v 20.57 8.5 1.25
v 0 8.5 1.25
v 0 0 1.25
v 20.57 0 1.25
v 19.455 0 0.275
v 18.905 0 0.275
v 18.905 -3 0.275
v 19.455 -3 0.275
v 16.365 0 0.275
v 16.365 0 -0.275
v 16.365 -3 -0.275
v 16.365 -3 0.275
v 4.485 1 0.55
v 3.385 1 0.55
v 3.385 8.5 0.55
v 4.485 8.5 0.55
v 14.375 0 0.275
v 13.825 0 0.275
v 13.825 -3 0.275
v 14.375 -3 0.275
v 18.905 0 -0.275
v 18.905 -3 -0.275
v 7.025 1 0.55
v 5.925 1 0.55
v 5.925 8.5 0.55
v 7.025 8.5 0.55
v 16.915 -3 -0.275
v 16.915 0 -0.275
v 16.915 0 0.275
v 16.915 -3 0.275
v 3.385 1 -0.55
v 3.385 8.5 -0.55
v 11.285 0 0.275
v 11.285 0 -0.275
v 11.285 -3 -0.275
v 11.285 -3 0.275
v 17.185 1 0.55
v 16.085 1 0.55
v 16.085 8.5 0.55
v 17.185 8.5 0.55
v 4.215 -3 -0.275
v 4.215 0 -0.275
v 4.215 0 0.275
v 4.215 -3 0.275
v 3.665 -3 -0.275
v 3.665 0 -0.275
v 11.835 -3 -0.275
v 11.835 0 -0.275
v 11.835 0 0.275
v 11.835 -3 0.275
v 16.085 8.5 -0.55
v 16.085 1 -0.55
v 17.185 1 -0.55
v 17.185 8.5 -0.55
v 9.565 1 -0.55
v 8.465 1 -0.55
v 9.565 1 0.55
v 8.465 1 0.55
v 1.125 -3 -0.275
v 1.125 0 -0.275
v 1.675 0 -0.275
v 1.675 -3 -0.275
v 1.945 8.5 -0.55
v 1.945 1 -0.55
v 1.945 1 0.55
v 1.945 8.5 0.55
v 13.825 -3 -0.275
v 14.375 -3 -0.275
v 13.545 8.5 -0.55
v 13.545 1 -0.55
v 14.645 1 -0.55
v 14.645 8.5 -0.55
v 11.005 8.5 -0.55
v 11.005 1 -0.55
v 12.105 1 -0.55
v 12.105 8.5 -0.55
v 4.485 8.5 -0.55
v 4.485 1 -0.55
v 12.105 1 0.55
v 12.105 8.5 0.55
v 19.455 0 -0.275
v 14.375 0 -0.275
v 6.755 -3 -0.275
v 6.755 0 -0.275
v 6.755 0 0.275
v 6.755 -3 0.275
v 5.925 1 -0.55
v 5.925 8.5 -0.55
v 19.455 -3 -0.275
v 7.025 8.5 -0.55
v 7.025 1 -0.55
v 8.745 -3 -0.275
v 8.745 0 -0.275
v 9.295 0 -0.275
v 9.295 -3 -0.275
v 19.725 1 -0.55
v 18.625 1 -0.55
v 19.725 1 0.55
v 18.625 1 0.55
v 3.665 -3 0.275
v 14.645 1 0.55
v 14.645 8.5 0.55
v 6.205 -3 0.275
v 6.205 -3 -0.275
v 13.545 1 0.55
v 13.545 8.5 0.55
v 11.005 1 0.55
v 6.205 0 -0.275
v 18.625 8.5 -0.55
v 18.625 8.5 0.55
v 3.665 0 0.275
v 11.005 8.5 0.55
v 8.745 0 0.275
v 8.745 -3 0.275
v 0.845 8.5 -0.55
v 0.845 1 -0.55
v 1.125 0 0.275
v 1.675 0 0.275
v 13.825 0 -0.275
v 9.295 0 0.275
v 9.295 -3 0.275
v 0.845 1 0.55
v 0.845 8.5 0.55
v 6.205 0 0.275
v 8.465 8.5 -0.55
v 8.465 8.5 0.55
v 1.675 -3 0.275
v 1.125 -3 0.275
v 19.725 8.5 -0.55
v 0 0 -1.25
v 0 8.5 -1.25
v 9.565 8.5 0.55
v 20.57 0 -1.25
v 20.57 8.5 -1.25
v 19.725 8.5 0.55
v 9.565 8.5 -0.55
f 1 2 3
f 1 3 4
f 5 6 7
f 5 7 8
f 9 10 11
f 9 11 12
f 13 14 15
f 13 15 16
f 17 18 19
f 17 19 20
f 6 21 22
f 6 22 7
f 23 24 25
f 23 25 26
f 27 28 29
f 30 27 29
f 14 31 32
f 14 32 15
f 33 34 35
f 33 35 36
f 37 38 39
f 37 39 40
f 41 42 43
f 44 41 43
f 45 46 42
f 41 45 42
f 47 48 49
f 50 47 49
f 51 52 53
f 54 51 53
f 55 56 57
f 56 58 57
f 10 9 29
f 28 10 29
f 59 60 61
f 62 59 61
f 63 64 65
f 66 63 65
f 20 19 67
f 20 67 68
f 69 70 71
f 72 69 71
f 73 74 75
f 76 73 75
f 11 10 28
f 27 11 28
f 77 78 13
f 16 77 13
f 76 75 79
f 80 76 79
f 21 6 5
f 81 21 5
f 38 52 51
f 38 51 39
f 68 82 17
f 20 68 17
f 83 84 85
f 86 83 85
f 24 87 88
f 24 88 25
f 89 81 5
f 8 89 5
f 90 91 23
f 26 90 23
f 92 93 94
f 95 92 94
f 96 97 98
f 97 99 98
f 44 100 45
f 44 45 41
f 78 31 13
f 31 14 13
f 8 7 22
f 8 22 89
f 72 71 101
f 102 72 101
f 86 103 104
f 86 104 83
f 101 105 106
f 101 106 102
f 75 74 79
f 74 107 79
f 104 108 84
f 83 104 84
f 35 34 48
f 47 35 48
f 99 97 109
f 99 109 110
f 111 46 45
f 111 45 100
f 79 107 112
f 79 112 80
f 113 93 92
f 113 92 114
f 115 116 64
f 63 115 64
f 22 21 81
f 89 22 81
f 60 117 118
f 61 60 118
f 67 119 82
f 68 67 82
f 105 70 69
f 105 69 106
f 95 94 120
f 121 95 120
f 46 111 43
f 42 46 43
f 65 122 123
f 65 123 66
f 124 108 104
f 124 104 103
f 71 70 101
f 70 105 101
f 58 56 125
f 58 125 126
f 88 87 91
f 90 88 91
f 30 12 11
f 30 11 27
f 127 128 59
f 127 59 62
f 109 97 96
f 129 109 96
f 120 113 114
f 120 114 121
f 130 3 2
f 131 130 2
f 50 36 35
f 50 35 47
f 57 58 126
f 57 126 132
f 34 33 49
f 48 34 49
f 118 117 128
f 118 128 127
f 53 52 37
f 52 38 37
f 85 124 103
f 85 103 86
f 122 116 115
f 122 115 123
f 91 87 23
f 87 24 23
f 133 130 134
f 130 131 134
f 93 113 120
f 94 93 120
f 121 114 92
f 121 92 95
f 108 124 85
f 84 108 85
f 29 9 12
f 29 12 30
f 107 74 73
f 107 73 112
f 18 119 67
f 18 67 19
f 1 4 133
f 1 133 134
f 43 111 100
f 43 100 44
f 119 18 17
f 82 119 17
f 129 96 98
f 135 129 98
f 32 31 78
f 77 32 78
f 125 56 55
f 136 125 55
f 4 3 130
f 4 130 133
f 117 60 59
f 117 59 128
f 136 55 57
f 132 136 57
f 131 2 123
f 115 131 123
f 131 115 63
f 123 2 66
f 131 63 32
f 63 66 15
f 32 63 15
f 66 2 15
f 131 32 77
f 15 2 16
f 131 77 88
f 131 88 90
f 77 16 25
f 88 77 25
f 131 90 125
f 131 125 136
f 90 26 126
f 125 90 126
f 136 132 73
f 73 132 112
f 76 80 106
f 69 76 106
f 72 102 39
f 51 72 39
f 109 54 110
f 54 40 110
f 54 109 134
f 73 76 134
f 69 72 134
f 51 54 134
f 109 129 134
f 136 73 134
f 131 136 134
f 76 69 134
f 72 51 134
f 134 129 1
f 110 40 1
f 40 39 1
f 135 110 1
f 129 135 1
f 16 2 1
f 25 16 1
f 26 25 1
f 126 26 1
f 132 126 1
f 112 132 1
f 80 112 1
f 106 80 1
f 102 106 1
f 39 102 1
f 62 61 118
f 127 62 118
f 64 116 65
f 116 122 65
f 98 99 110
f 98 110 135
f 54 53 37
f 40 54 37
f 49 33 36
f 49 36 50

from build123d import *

# Parameters (mm, degrees)
SKETCH1_W             = 20.57
SKETCH1_H             = 8.5
BOSS_EXTRUDE1_DEPTH   = 1.25
SKETCH2_W             = 1.1
SKETCH2_H             = 1.1
CUT_EXTRUDE1_DEPTH    = 9.5
SKETCH3_W             = 20.57
SKETCH3_H             = 2.5
BOSS_EXTRUDE2_DEPTH   = 1
SKETCH4_W             = 0.55
SKETCH4_H             = 0.55
BOSS_EXTRUDE3_DEPTH   = 3
BOSS_EXTRUDE3_2_DEPTH = 3
BOSS_EXTRUDE3_3_DEPTH = 3
BOSS_EXTRUDE3_4_DEPTH = 3
BOSS_EXTRUDE3_5_DEPTH = 3
BOSS_EXTRUDE3_6_DEPTH = 3
BOSS_EXTRUDE3_7_DEPTH = 3
BOSS_EXTRUDE3_8_DEPTH = 3


with BuildPart() as part:
    # Sketch1 → Boss-Extrude1 (new body, symmetric)
    with BuildSketch(Plane.XY):
        with Locations((10.285, 4.25)):
            Rectangle(SKETCH1_W, SKETCH1_H)
    extrude(amount=BOSS_EXTRUDE1_DEPTH, both=True)

    # Sketch2 → Cut-Extrude1 (cut, through all)
    with BuildSketch(Plane.XZ):
        with Locations((3.935, 0)):
            Rectangle(SKETCH2_W, SKETCH2_H)
        with Locations((1.395, 0)):
            Rectangle(SKETCH2_W, SKETCH2_H)
        with Locations((6.475, 0)):
            Rectangle(SKETCH2_W, SKETCH2_H)
        with Locations((9.015, 0)):
            Rectangle(SKETCH2_W, SKETCH2_H)
        with Locations((11.555, 0)):
            Rectangle(SKETCH2_W, SKETCH2_H)
        with Locations((14.095, 0)):
            Rectangle(SKETCH2_W, SKETCH2_H)
        with Locations((16.635, 0)):
            Rectangle(SKETCH2_W, SKETCH2_H)
        with Locations((19.175, 0)):
            Rectangle(SKETCH2_W, SKETCH2_H)
    extrude(amount=-CUT_EXTRUDE1_DEPTH, mode=Mode.SUBTRACT)

    # Sketch3 → Boss-Extrude2 (add)
    with BuildSketch(Plane.XZ):
        with Locations((10.285, 0)):
            Rectangle(SKETCH3_W, SKETCH3_H)
    extrude(amount=-BOSS_EXTRUDE2_DEPTH)


with BuildPart() as body_2:
    # Sketch4 → Boss-Extrude3 (new body)
    with BuildSketch(Plane.XZ):
        with Locations((1.4, 0)):
            Rectangle(SKETCH4_W, SKETCH4_H)
    extrude(amount=BOSS_EXTRUDE3_DEPTH)


with BuildPart() as body_3:
    # Sketch4 → Boss-Extrude3 2 (new body)
    with BuildSketch(Plane.XZ):
        with Locations((3.94, 0)):
            Rectangle(SKETCH4_W, SKETCH4_H)
    extrude(amount=BOSS_EXTRUDE3_2_DEPTH)


with BuildPart() as body_4:
    # Sketch4 → Boss-Extrude3 3 (new body)
    with BuildSketch(Plane.XZ):
        with Locations((6.48, 0)):
            Rectangle(SKETCH4_W, SKETCH4_H)
    extrude(amount=BOSS_EXTRUDE3_3_DEPTH)


with BuildPart() as body_5:
    # Sketch4 → Boss-Extrude3 4 (new body)
    with BuildSketch(Plane.XZ):
        with Locations((9.02, 0)):
            Rectangle(SKETCH4_W, SKETCH4_H)
    extrude(amount=BOSS_EXTRUDE3_4_DEPTH)


with BuildPart() as body_6:
    # Sketch4 → Boss-Extrude3 5 (new body)
    with BuildSketch(Plane.XZ):
        with Locations((11.56, 0)):
            Rectangle(SKETCH4_W, SKETCH4_H)
    extrude(amount=BOSS_EXTRUDE3_5_DEPTH)


with BuildPart() as body_7:
    # Sketch4 → Boss-Extrude3 6 (new body)
    with BuildSketch(Plane.XZ):
        with Locations((14.1, 0)):
            Rectangle(SKETCH4_W, SKETCH4_H)
    extrude(amount=BOSS_EXTRUDE3_6_DEPTH)


with BuildPart() as body_8:
    # Sketch4 → Boss-Extrude3 7 (new body)
    with BuildSketch(Plane.XZ):
        with Locations((16.64, 0)):
            Rectangle(SKETCH4_W, SKETCH4_H)
    extrude(amount=BOSS_EXTRUDE3_7_DEPTH)


with BuildPart() as body_9:
    # Sketch4 → Boss-Extrude3 8 (new body)
    with BuildSketch(Plane.XZ):
        with Locations((19.18, 0)):
            Rectangle(SKETCH4_W, SKETCH4_H)
    extrude(amount=BOSS_EXTRUDE3_8_DEPTH)


solid = Compound([part.part, body_2.part, body_3.part, body_4.part, body_5.part, body_6.part, body_7.part, body_8.part, body_9.part])
